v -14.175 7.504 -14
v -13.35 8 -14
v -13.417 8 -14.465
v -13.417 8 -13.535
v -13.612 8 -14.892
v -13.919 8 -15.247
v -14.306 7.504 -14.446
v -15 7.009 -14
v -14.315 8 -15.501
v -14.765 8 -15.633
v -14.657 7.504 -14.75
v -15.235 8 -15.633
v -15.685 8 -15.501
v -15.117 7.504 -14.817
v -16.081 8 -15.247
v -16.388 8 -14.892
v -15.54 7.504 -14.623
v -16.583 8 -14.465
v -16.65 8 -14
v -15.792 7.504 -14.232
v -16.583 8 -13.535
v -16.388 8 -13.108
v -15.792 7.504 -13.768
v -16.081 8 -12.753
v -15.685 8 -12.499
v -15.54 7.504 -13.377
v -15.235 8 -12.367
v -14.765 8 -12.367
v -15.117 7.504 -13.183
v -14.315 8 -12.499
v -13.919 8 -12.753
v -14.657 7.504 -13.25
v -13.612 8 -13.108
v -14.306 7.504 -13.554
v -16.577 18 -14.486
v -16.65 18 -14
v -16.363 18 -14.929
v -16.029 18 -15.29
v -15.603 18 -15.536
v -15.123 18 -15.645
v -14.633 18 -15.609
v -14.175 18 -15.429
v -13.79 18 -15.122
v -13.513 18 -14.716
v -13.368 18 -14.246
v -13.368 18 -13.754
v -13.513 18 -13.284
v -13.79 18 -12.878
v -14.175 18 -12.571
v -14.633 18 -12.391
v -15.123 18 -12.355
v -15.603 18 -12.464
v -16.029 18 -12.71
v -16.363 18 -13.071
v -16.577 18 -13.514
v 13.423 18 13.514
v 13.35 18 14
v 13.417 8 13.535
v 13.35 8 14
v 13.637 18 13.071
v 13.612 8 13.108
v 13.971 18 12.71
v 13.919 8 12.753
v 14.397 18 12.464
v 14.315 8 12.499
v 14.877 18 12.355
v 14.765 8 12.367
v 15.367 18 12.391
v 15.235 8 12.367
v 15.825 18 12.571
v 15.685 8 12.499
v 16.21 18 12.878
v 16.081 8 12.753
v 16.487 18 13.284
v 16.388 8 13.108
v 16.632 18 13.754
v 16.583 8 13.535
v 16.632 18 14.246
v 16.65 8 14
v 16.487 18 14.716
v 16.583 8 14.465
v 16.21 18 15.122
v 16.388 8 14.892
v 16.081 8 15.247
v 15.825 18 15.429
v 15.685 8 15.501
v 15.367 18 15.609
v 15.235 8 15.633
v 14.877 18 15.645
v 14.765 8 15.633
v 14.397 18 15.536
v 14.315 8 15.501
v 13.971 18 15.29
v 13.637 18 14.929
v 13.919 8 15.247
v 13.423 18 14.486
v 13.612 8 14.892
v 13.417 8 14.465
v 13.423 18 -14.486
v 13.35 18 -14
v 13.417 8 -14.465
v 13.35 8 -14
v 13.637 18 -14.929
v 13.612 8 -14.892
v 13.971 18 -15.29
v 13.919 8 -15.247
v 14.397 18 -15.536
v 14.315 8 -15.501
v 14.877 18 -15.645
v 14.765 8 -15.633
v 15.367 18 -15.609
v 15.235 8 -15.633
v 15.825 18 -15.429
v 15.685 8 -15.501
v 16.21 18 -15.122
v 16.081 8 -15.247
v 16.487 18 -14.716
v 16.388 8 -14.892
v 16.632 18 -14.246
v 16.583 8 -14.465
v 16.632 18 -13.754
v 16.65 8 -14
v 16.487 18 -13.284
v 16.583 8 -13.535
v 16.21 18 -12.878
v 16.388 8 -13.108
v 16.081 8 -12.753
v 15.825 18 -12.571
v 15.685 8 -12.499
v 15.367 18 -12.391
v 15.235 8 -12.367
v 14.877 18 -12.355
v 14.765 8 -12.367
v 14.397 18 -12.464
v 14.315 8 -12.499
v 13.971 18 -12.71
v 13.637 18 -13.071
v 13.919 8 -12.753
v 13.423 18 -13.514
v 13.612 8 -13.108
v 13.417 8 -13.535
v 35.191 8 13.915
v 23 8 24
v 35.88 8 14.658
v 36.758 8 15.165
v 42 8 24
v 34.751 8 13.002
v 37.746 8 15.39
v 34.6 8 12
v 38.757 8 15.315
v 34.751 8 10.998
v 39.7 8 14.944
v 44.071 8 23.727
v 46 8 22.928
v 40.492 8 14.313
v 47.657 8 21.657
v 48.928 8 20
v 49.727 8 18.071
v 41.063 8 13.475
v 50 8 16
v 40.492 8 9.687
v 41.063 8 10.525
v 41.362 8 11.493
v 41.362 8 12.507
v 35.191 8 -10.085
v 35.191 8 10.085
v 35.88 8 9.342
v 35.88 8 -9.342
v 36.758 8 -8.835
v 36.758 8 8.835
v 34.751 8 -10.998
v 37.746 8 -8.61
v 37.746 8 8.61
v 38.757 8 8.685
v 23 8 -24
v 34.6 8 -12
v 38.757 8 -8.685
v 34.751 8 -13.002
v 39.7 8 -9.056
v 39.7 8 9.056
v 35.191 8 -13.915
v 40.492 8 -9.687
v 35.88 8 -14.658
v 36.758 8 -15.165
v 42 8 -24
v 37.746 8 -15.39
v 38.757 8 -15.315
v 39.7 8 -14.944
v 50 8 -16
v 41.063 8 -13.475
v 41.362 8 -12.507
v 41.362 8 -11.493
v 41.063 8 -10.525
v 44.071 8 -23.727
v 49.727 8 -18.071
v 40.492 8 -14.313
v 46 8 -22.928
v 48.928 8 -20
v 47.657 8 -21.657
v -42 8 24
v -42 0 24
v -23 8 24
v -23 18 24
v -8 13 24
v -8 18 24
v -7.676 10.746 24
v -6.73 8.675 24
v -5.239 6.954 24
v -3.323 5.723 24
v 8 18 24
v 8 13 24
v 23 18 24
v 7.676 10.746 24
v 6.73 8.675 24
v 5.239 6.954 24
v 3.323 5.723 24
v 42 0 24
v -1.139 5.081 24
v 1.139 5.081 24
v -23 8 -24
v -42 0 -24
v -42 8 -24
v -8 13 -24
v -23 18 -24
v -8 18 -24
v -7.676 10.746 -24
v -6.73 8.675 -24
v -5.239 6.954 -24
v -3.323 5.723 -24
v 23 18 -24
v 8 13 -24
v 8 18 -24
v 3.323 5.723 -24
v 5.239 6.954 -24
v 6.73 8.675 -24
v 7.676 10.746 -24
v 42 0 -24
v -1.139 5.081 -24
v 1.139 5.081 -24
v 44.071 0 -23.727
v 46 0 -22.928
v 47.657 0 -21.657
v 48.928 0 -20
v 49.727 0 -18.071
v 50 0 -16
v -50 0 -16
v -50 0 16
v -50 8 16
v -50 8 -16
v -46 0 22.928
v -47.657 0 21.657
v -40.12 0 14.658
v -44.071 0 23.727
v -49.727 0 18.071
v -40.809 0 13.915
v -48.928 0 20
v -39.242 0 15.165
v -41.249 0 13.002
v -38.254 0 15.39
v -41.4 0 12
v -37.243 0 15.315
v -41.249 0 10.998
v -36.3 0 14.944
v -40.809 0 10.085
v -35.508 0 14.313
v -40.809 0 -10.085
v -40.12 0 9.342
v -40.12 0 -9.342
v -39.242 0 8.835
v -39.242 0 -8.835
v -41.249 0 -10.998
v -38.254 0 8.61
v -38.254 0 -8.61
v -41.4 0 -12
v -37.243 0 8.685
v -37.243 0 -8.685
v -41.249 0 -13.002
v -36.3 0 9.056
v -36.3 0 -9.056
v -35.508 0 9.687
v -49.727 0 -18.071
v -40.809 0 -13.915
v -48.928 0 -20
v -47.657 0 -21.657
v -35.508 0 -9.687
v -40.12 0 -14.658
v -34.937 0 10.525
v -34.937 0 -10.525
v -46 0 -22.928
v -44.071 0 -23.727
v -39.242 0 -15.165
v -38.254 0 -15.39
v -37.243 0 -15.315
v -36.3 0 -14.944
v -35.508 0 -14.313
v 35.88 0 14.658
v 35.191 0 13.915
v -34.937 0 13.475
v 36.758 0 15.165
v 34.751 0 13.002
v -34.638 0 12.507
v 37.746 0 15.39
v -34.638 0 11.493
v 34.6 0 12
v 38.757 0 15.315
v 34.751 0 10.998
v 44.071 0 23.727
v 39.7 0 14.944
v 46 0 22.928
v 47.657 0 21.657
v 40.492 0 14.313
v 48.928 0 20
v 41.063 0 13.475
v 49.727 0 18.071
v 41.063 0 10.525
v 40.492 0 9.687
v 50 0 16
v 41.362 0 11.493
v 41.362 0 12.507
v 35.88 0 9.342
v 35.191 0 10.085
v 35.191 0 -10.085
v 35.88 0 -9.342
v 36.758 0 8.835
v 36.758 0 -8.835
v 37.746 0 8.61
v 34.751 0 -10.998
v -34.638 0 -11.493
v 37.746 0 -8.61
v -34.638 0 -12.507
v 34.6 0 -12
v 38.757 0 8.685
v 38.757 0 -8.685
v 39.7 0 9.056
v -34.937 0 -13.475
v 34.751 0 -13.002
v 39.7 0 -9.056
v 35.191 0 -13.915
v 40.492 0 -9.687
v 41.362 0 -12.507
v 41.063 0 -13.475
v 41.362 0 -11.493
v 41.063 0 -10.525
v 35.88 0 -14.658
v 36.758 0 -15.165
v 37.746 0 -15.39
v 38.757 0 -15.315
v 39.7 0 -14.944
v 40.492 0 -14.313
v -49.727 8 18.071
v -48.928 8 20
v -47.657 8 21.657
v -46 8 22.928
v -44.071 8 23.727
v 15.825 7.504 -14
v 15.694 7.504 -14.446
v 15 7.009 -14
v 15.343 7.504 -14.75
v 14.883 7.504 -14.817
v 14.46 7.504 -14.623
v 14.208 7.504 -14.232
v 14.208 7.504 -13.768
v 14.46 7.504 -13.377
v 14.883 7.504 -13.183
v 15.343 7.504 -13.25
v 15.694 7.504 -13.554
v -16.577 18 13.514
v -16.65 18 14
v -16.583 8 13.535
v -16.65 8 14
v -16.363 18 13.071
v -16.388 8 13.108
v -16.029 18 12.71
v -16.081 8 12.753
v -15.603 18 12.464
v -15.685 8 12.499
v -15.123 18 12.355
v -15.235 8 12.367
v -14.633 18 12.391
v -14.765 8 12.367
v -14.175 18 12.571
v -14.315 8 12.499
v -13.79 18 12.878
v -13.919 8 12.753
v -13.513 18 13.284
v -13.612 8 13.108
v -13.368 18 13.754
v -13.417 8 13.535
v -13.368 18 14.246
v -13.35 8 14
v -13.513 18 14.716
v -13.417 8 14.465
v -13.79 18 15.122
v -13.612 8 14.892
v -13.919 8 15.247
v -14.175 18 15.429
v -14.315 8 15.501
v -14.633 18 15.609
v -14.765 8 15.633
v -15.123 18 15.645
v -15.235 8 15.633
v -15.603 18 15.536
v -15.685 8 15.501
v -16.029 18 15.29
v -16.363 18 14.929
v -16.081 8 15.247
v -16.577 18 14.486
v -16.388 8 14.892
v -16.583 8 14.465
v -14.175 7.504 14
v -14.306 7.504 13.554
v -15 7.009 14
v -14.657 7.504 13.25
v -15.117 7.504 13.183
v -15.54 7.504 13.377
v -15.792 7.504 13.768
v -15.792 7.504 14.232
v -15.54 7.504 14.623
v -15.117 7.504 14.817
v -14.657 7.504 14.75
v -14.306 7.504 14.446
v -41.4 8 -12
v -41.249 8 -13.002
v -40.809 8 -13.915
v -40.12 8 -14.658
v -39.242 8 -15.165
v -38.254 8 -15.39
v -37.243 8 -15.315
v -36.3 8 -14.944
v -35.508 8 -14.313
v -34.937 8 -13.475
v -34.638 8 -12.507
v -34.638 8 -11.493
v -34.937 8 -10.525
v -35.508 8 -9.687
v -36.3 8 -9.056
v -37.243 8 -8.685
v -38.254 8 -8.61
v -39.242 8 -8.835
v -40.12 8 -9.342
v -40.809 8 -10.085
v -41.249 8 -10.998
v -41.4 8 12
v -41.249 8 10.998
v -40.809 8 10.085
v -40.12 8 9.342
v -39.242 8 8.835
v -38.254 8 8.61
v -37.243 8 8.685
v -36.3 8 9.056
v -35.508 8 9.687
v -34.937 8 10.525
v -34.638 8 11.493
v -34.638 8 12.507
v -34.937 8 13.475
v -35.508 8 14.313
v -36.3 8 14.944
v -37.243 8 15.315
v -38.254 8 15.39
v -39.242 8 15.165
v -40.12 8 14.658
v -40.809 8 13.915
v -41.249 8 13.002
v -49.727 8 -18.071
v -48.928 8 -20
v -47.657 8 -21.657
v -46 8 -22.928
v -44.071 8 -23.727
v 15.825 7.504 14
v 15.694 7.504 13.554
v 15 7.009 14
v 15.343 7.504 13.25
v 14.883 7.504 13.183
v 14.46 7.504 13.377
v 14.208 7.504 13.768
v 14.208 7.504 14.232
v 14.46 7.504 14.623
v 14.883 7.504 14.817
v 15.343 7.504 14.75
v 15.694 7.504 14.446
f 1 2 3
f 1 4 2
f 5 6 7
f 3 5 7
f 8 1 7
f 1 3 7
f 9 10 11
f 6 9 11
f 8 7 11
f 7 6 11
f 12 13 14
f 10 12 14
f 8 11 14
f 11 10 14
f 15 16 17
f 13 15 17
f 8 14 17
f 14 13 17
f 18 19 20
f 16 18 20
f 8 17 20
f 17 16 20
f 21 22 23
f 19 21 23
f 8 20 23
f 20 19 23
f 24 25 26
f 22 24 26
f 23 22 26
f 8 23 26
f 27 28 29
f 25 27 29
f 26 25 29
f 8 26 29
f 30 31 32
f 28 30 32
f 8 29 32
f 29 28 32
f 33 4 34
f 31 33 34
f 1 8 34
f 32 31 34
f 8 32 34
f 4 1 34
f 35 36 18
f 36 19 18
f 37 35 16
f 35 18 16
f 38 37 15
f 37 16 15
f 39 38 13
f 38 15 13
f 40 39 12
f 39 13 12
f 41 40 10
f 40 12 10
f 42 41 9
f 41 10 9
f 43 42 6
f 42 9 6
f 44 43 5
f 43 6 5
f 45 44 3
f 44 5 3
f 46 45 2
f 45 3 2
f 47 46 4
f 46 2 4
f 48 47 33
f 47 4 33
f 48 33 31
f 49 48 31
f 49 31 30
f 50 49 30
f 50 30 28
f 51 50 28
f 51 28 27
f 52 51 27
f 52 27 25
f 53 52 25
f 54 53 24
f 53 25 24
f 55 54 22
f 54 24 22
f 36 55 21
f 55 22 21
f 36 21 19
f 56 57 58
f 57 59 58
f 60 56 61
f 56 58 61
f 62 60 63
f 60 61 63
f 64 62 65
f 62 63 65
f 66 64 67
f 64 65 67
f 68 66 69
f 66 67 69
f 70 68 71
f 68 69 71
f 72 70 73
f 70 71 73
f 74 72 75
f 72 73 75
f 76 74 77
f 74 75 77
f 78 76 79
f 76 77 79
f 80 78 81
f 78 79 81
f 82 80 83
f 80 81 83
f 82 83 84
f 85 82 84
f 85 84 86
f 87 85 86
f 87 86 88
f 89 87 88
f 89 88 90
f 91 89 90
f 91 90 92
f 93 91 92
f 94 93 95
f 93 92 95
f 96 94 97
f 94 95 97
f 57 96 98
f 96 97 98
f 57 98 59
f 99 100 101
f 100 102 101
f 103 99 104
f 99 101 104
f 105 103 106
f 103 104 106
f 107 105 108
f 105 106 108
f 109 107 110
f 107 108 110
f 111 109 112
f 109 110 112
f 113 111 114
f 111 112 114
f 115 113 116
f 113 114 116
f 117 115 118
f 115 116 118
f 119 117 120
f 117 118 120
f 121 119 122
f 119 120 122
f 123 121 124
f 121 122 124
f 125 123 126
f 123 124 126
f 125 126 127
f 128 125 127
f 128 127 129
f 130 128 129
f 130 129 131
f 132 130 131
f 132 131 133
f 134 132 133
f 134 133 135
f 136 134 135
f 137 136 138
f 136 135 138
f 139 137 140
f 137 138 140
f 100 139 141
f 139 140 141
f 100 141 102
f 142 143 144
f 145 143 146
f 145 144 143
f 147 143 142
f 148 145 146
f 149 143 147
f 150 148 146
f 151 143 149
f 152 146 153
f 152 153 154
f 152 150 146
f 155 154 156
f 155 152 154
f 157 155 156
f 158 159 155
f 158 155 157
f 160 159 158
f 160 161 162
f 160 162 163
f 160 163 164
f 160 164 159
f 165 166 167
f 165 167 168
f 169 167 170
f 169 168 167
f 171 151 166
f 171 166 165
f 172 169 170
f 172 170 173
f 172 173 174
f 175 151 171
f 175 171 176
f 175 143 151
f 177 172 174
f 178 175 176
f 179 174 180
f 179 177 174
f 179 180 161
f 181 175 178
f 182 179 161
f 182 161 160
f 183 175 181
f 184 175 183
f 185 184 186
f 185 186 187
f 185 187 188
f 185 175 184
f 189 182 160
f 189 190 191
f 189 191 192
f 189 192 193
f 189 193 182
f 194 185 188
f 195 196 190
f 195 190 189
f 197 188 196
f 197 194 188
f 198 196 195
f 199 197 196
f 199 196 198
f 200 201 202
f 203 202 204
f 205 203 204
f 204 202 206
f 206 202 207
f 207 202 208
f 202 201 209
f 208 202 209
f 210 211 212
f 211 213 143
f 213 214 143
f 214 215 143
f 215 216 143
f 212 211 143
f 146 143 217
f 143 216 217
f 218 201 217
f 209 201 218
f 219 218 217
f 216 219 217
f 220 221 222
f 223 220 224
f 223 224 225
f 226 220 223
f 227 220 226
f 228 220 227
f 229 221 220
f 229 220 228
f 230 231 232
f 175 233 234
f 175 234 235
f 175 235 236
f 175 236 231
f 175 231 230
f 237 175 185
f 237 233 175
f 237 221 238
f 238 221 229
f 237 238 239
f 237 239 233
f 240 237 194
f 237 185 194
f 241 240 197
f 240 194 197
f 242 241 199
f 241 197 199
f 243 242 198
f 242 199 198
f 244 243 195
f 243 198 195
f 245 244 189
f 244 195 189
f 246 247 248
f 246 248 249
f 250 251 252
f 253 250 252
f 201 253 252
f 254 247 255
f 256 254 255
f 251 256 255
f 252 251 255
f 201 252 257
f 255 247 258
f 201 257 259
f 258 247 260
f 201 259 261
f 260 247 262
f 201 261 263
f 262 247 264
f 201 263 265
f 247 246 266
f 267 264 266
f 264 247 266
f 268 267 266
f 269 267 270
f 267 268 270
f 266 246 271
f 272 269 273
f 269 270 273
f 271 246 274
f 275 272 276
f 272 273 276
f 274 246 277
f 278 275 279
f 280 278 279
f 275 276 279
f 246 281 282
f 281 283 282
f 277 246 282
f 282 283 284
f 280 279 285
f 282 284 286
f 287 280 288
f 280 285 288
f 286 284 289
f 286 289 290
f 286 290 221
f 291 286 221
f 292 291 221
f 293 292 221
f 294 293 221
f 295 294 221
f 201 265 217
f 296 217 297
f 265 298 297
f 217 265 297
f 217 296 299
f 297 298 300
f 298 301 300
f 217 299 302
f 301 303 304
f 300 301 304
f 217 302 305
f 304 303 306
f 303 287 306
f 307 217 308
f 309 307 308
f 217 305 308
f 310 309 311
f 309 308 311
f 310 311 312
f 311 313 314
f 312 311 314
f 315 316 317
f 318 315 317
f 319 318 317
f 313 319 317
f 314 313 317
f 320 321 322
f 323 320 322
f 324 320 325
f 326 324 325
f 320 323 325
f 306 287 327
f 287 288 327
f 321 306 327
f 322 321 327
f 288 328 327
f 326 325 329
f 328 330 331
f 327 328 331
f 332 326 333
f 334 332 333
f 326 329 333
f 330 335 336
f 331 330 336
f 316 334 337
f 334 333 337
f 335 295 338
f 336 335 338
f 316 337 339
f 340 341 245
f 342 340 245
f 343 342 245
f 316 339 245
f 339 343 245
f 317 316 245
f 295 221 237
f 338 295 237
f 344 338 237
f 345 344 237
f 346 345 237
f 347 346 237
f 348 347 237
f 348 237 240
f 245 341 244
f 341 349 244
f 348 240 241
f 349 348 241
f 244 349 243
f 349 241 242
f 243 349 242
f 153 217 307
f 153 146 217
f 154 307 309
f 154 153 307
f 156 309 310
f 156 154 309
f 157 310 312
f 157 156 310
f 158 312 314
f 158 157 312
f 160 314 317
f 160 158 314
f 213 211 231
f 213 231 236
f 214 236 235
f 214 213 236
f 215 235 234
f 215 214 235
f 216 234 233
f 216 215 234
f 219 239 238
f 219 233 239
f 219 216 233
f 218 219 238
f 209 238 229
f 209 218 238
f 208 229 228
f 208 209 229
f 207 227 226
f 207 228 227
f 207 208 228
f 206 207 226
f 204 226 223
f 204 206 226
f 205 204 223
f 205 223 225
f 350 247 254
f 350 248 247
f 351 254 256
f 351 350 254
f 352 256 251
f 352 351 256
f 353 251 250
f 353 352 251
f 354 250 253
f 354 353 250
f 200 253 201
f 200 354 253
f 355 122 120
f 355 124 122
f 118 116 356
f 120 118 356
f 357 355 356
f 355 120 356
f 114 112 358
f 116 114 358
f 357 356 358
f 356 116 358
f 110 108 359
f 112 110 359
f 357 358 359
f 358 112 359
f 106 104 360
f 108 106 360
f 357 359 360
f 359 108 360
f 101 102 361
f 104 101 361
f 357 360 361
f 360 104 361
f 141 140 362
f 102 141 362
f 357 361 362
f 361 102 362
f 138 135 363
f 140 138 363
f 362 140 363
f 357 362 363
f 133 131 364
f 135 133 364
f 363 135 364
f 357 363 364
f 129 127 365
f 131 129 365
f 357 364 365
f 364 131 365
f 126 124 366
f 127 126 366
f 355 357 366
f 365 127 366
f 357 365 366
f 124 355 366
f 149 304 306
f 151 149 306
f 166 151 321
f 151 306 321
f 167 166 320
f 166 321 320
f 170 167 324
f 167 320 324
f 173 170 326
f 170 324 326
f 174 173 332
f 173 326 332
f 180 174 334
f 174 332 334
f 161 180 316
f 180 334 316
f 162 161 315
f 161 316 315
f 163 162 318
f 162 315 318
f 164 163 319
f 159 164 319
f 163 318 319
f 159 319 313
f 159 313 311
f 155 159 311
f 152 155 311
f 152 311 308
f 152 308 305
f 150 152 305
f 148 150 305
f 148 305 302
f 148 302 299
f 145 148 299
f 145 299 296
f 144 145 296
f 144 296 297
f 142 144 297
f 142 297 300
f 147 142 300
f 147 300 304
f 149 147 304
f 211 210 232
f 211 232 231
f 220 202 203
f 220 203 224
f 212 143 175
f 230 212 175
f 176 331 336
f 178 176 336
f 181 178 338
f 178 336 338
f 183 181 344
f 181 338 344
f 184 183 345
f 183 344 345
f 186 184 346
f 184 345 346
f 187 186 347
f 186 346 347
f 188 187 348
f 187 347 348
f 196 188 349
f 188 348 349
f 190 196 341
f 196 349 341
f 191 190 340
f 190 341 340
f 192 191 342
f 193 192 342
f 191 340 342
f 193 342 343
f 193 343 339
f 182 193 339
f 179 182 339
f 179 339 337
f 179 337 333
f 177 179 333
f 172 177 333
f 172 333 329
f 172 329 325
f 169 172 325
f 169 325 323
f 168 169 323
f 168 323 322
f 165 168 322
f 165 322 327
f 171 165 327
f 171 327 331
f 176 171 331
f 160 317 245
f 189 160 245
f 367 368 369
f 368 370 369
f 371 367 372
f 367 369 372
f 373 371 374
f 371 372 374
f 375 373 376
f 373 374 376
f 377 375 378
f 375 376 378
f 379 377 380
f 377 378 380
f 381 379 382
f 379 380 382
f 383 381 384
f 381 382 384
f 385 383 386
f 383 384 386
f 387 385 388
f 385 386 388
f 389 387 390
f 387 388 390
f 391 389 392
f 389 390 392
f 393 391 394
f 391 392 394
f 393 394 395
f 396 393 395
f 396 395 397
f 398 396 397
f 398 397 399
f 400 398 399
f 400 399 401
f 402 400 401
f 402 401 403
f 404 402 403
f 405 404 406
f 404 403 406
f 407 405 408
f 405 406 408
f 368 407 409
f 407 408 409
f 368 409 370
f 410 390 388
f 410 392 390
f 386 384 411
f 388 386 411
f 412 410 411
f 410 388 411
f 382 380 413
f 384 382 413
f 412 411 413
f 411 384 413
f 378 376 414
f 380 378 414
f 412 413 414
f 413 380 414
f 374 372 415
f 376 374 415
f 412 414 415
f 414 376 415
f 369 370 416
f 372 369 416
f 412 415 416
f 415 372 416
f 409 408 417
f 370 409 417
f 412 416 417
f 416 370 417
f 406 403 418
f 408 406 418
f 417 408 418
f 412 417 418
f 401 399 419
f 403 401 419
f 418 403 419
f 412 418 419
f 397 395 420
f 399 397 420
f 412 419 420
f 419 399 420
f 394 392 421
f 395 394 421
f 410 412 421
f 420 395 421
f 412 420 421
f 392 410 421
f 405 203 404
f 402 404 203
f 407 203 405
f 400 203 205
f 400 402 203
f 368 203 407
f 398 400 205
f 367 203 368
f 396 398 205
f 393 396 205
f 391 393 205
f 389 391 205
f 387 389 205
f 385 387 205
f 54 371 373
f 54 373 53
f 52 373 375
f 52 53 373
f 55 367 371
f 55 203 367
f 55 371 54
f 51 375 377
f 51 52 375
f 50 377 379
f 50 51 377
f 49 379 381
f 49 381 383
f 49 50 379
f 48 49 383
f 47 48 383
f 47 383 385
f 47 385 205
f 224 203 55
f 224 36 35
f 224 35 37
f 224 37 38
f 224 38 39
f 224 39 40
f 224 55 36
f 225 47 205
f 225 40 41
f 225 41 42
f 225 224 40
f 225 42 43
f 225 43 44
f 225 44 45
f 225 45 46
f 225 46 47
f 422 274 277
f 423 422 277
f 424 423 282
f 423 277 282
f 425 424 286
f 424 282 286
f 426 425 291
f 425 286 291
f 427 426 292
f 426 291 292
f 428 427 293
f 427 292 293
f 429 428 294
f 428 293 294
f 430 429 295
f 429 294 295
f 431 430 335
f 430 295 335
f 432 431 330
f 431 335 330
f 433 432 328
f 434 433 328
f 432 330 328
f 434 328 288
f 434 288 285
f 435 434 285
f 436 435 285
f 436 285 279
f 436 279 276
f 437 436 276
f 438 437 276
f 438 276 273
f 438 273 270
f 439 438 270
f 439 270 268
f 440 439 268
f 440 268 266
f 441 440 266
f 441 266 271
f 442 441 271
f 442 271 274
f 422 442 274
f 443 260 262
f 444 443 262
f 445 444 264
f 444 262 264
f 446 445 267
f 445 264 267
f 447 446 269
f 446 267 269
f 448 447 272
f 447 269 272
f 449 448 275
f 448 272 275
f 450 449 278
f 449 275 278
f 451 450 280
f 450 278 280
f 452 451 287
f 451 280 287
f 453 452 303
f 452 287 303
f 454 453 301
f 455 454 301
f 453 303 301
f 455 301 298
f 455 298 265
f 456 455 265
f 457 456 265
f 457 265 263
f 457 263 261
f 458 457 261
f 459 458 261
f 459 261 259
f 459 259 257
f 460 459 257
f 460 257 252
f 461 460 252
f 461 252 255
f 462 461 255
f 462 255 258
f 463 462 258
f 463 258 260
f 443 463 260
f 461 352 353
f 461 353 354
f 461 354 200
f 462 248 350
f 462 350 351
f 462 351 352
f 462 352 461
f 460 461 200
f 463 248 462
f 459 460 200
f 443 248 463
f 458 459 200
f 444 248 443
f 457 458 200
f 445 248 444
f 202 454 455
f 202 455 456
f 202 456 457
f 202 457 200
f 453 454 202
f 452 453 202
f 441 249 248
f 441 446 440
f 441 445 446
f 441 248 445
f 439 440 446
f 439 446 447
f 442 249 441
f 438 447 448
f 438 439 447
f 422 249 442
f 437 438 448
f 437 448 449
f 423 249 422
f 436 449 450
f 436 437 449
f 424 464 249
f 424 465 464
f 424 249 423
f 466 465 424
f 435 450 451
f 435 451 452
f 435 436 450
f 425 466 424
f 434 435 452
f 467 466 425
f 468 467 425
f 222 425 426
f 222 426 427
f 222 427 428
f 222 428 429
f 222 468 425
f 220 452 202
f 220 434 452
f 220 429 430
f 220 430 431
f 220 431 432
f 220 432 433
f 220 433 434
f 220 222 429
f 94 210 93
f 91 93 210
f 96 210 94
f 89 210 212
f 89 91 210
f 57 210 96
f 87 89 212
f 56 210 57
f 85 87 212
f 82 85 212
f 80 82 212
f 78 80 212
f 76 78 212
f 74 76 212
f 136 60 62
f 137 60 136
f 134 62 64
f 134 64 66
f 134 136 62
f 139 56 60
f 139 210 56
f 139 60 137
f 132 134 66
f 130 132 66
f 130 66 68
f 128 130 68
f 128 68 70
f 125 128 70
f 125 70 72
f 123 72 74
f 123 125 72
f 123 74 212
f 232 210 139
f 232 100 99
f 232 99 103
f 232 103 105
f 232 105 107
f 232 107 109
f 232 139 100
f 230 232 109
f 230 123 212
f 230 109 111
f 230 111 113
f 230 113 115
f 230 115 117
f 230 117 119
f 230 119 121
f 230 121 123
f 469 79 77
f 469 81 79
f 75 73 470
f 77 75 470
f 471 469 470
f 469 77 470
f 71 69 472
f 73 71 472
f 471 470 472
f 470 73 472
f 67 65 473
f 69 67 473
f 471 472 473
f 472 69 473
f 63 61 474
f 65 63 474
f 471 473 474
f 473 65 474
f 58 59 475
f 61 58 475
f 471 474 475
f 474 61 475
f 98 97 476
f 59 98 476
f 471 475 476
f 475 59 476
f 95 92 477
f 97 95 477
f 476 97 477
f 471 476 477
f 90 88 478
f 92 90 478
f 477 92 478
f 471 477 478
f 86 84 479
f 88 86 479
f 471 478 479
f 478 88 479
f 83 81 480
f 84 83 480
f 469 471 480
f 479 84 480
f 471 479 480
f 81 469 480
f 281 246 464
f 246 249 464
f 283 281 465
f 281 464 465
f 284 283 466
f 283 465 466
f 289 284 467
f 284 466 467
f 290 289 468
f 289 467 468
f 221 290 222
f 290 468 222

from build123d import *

# Parameters (mm, degrees)
SKETCH1_W             = 100
SKETCH1_H             = 48
BOSS_EXTRUDE1_DEPTH   = 8
SKETCH2_W             = 46
SKETCH2_H             = 48
BOSS_EXTRUDE2_DEPTH   = 10
CUT_EXTRUDE1_DEPTH    = 72.61005516
FILLET1_R             = 8
M4_TAPPED_HOLE1_D     = 3.3
M4_TAPPED_HOLE1_DEPTH = 10
M4_TAPPED_HOLE1_TIP   = 0.991420021
M8_TAPPED_HOLE1_D     = 6.8


with BuildPart() as part:
    # Sketch1 → Boss-Extrude1 (new body)
    with BuildSketch(Plane(origin=(0, 0, 0), x_dir=(1, 0, 0), z_dir=(0, 1, 0))):
        Rectangle(SKETCH1_W, SKETCH1_H)
    extrude(amount=BOSS_EXTRUDE1_DEPTH)

    # Sketch2 → Boss-Extrude2 (add)
    with BuildSketch(Plane(origin=(0, 8, 0), x_dir=(1, 0, 0), z_dir=(0, 1, 0))):
        Rectangle(SKETCH2_W, SKETCH2_H)
    extrude(amount=BOSS_EXTRUDE2_DEPTH)

    # Sketch3 → Cut-Extrude1 (cut, through all)
    with BuildSketch(Plane.XY.offset(24)):
        with BuildLine():
            Line((-8, 13), (-8, 18))
            Line((-8, 18), (8, 18))
            Line((8, 18), (8, 13))
            ThreePointArc((8, 13), (0, 5), (-8, 13))
        make_face()
    extrude(amount=-CUT_EXTRUDE1_DEPTH, mode=Mode.SUBTRACT)

    # Fillet1
    fillet1_edges = [part.edges().sort_by_distance(p)[0] for p in [
        (50, 4, 24),
        (-50, 4, 24),
        (-50, 4, -24),
        (50, 4, -24),
    ]]
    fillet(fillet1_edges, radius=FILLET1_R)

    # M4 Tapped Hole1
    with Locations(Plane(origin=(0, 18, 0), x_dir=(1, 0, 0), z_dir=(0, 1, 0))):
        with Locations((-15, 14), (-15, -14), (15, -14), (15, 14)):
            Hole(M4_TAPPED_HOLE1_D / 2, depth=M4_TAPPED_HOLE1_DEPTH)
            with Locations((0, 0, -(M4_TAPPED_HOLE1_DEPTH + M4_TAPPED_HOLE1_TIP / 2))):  # 118° drill point
                Cone(0, M4_TAPPED_HOLE1_D / 2, M4_TAPPED_HOLE1_TIP, mode=Mode.SUBTRACT)

    # M8 Tapped Hole1 (through all)
    with Locations(Plane(origin=(0, 8, 0), x_dir=(1, 0, 0), z_dir=(0, 1, 0))):
        with Locations((-38, 12), (-38, -12), (38, -12), (38, 12)):
            Hole(M8_TAPPED_HOLE1_D / 2)


solid = part.part
